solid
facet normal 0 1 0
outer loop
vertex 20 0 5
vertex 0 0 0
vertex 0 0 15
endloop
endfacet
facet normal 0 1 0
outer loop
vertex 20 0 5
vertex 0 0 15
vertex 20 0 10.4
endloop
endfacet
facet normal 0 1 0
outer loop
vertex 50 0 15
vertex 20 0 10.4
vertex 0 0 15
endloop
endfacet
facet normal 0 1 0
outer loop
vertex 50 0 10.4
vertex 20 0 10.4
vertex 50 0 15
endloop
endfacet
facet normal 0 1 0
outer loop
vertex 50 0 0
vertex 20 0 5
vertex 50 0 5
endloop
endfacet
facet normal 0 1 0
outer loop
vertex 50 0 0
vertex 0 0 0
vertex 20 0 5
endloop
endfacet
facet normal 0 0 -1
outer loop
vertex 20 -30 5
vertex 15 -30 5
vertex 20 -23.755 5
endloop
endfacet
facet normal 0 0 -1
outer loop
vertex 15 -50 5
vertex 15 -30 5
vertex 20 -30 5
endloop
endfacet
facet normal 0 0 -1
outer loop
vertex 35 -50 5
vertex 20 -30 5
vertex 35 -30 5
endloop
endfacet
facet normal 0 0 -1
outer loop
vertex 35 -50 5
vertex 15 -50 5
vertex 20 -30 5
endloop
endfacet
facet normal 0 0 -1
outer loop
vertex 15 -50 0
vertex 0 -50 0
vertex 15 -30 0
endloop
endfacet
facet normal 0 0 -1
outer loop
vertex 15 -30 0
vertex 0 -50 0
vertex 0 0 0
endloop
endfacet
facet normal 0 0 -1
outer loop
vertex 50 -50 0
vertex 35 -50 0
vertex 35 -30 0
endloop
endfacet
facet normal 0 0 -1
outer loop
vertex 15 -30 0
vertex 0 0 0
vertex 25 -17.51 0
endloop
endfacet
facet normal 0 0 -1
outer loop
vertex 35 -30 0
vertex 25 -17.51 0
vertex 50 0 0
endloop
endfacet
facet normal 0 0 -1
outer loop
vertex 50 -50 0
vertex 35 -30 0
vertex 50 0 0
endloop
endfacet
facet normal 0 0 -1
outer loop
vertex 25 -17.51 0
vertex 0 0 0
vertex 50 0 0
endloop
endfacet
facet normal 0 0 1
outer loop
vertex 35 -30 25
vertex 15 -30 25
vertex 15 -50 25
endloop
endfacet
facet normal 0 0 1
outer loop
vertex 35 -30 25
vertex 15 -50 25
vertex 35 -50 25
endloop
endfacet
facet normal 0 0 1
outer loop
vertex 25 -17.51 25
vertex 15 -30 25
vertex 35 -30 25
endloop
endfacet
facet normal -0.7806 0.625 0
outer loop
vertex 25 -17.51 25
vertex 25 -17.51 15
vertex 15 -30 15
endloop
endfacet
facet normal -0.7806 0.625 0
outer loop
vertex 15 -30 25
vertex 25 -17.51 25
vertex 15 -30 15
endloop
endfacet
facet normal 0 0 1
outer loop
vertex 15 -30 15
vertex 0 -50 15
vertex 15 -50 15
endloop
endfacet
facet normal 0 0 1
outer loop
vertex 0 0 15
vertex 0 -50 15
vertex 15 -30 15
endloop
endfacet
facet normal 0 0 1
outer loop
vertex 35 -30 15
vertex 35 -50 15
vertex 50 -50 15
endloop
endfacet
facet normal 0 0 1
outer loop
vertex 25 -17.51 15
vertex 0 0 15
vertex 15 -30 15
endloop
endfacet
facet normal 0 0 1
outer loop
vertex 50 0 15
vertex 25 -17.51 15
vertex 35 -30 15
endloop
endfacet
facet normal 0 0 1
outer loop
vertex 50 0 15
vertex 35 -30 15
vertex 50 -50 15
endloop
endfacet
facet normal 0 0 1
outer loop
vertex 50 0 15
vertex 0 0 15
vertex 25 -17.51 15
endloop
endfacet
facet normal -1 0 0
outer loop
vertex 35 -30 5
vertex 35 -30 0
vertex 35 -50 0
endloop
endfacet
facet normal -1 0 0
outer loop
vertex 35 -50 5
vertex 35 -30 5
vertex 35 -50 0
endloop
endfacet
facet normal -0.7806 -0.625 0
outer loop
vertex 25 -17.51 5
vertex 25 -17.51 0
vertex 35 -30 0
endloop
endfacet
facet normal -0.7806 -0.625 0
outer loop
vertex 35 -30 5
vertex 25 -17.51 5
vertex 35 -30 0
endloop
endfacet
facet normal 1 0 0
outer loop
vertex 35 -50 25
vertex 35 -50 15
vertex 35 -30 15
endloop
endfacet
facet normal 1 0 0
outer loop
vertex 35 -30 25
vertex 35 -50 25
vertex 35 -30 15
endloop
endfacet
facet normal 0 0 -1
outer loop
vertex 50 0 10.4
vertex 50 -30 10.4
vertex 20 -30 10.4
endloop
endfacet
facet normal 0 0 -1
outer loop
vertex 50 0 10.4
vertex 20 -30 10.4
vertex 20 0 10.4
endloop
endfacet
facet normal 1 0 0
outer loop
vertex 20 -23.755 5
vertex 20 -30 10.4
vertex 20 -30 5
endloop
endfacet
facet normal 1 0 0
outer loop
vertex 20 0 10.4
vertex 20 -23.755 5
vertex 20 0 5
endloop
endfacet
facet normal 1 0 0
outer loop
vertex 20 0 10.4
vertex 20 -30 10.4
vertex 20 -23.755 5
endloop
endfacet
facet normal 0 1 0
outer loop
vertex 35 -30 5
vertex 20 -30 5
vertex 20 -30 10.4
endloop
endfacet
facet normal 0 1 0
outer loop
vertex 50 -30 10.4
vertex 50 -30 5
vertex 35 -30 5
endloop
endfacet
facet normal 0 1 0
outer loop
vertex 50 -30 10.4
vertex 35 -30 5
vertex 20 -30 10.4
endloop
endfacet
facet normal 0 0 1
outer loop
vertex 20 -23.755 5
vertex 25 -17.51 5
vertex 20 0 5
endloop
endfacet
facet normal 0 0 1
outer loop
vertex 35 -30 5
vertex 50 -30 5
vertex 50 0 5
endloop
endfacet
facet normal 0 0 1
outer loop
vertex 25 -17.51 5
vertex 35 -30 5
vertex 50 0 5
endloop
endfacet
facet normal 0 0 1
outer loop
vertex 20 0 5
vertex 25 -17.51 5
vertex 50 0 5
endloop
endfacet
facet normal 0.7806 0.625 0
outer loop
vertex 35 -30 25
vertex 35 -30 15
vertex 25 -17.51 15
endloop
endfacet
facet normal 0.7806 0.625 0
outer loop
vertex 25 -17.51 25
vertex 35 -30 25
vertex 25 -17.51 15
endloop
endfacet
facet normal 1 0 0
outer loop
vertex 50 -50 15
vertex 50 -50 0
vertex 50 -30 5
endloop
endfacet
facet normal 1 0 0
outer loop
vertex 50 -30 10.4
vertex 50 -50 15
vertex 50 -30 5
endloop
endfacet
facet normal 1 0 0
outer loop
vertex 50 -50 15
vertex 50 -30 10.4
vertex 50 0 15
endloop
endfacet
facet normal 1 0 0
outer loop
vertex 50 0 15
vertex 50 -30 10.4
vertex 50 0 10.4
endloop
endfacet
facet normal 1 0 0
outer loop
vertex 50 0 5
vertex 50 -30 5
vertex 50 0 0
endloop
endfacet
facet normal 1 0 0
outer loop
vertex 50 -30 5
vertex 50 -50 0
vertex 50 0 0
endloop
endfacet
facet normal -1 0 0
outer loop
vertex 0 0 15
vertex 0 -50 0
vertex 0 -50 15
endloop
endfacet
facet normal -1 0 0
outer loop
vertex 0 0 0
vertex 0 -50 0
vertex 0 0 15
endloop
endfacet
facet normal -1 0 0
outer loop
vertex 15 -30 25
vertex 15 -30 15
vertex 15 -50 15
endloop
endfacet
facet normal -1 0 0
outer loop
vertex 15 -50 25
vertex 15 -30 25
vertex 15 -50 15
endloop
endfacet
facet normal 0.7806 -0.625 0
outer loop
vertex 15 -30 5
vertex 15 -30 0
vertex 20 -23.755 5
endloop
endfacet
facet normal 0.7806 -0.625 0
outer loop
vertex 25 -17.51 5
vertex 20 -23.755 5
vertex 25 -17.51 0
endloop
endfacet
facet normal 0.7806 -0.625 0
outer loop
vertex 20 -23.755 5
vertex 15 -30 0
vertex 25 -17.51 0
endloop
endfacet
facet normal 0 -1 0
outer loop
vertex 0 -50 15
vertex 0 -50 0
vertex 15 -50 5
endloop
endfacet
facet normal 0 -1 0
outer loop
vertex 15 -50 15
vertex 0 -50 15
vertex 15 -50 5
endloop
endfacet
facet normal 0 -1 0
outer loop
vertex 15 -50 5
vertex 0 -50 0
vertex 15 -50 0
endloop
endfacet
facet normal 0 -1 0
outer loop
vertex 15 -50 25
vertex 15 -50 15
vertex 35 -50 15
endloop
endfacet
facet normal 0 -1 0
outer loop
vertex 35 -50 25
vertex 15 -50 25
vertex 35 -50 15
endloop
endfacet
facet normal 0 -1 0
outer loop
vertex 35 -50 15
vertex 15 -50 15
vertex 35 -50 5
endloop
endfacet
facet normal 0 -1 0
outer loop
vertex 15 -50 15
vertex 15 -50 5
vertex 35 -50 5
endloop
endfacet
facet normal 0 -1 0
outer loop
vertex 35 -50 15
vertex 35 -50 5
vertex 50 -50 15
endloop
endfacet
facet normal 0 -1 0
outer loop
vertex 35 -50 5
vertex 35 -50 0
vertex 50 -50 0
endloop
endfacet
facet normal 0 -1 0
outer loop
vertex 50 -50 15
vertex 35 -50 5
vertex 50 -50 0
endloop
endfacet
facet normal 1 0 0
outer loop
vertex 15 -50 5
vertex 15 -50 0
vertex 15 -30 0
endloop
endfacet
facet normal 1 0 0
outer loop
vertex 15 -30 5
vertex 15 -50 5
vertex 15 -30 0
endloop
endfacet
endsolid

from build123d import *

# Parameters (mm, degrees)
F0_W     = 50
F0_H     = 50
F1_DEPTH = 15
F3_DEPTH = 10
F5_DEPTH = 5
F6_W     = 30
F6_H     = 5.4
F7_DEPTH = 30


with BuildPart() as f1:
    # F0 (on Top) → F1 (new body)
    with BuildSketch(Plane.XY):
        with Locations((25, -25)):
            Rectangle(F0_W, F0_H)
    extrude(amount=F1_DEPTH)

    # F2 (on face) → F3 (join)
    with BuildSketch(Plane.XY.offset(15)):
        Polygon((15, -30), (15, -50), (35, -50), (35, -30), (25, -17.510004), align=None)
    extrude(amount=F3_DEPTH)

    # F4 (on face) → F5 (cut)
    with BuildSketch(Plane(origin=(0, 0, 0), x_dir=(1, 0, 0), z_dir=(0, 0, -1))):
        Polygon((35, 50), (15, 50), (15, 30), (25, 17.510004), (35, 30), align=None)
    extrude(amount=-F5_DEPTH, mode=Mode.SUBTRACT)

    # F6 (on face) → F7 (cut)
    with BuildSketch(Plane.YZ.offset(50)):
        with Locations((-15, 7.7)):
            Rectangle(F6_W, F6_H)
    extrude(amount=-F7_DEPTH, mode=Mode.SUBTRACT)


solid = f1.part
